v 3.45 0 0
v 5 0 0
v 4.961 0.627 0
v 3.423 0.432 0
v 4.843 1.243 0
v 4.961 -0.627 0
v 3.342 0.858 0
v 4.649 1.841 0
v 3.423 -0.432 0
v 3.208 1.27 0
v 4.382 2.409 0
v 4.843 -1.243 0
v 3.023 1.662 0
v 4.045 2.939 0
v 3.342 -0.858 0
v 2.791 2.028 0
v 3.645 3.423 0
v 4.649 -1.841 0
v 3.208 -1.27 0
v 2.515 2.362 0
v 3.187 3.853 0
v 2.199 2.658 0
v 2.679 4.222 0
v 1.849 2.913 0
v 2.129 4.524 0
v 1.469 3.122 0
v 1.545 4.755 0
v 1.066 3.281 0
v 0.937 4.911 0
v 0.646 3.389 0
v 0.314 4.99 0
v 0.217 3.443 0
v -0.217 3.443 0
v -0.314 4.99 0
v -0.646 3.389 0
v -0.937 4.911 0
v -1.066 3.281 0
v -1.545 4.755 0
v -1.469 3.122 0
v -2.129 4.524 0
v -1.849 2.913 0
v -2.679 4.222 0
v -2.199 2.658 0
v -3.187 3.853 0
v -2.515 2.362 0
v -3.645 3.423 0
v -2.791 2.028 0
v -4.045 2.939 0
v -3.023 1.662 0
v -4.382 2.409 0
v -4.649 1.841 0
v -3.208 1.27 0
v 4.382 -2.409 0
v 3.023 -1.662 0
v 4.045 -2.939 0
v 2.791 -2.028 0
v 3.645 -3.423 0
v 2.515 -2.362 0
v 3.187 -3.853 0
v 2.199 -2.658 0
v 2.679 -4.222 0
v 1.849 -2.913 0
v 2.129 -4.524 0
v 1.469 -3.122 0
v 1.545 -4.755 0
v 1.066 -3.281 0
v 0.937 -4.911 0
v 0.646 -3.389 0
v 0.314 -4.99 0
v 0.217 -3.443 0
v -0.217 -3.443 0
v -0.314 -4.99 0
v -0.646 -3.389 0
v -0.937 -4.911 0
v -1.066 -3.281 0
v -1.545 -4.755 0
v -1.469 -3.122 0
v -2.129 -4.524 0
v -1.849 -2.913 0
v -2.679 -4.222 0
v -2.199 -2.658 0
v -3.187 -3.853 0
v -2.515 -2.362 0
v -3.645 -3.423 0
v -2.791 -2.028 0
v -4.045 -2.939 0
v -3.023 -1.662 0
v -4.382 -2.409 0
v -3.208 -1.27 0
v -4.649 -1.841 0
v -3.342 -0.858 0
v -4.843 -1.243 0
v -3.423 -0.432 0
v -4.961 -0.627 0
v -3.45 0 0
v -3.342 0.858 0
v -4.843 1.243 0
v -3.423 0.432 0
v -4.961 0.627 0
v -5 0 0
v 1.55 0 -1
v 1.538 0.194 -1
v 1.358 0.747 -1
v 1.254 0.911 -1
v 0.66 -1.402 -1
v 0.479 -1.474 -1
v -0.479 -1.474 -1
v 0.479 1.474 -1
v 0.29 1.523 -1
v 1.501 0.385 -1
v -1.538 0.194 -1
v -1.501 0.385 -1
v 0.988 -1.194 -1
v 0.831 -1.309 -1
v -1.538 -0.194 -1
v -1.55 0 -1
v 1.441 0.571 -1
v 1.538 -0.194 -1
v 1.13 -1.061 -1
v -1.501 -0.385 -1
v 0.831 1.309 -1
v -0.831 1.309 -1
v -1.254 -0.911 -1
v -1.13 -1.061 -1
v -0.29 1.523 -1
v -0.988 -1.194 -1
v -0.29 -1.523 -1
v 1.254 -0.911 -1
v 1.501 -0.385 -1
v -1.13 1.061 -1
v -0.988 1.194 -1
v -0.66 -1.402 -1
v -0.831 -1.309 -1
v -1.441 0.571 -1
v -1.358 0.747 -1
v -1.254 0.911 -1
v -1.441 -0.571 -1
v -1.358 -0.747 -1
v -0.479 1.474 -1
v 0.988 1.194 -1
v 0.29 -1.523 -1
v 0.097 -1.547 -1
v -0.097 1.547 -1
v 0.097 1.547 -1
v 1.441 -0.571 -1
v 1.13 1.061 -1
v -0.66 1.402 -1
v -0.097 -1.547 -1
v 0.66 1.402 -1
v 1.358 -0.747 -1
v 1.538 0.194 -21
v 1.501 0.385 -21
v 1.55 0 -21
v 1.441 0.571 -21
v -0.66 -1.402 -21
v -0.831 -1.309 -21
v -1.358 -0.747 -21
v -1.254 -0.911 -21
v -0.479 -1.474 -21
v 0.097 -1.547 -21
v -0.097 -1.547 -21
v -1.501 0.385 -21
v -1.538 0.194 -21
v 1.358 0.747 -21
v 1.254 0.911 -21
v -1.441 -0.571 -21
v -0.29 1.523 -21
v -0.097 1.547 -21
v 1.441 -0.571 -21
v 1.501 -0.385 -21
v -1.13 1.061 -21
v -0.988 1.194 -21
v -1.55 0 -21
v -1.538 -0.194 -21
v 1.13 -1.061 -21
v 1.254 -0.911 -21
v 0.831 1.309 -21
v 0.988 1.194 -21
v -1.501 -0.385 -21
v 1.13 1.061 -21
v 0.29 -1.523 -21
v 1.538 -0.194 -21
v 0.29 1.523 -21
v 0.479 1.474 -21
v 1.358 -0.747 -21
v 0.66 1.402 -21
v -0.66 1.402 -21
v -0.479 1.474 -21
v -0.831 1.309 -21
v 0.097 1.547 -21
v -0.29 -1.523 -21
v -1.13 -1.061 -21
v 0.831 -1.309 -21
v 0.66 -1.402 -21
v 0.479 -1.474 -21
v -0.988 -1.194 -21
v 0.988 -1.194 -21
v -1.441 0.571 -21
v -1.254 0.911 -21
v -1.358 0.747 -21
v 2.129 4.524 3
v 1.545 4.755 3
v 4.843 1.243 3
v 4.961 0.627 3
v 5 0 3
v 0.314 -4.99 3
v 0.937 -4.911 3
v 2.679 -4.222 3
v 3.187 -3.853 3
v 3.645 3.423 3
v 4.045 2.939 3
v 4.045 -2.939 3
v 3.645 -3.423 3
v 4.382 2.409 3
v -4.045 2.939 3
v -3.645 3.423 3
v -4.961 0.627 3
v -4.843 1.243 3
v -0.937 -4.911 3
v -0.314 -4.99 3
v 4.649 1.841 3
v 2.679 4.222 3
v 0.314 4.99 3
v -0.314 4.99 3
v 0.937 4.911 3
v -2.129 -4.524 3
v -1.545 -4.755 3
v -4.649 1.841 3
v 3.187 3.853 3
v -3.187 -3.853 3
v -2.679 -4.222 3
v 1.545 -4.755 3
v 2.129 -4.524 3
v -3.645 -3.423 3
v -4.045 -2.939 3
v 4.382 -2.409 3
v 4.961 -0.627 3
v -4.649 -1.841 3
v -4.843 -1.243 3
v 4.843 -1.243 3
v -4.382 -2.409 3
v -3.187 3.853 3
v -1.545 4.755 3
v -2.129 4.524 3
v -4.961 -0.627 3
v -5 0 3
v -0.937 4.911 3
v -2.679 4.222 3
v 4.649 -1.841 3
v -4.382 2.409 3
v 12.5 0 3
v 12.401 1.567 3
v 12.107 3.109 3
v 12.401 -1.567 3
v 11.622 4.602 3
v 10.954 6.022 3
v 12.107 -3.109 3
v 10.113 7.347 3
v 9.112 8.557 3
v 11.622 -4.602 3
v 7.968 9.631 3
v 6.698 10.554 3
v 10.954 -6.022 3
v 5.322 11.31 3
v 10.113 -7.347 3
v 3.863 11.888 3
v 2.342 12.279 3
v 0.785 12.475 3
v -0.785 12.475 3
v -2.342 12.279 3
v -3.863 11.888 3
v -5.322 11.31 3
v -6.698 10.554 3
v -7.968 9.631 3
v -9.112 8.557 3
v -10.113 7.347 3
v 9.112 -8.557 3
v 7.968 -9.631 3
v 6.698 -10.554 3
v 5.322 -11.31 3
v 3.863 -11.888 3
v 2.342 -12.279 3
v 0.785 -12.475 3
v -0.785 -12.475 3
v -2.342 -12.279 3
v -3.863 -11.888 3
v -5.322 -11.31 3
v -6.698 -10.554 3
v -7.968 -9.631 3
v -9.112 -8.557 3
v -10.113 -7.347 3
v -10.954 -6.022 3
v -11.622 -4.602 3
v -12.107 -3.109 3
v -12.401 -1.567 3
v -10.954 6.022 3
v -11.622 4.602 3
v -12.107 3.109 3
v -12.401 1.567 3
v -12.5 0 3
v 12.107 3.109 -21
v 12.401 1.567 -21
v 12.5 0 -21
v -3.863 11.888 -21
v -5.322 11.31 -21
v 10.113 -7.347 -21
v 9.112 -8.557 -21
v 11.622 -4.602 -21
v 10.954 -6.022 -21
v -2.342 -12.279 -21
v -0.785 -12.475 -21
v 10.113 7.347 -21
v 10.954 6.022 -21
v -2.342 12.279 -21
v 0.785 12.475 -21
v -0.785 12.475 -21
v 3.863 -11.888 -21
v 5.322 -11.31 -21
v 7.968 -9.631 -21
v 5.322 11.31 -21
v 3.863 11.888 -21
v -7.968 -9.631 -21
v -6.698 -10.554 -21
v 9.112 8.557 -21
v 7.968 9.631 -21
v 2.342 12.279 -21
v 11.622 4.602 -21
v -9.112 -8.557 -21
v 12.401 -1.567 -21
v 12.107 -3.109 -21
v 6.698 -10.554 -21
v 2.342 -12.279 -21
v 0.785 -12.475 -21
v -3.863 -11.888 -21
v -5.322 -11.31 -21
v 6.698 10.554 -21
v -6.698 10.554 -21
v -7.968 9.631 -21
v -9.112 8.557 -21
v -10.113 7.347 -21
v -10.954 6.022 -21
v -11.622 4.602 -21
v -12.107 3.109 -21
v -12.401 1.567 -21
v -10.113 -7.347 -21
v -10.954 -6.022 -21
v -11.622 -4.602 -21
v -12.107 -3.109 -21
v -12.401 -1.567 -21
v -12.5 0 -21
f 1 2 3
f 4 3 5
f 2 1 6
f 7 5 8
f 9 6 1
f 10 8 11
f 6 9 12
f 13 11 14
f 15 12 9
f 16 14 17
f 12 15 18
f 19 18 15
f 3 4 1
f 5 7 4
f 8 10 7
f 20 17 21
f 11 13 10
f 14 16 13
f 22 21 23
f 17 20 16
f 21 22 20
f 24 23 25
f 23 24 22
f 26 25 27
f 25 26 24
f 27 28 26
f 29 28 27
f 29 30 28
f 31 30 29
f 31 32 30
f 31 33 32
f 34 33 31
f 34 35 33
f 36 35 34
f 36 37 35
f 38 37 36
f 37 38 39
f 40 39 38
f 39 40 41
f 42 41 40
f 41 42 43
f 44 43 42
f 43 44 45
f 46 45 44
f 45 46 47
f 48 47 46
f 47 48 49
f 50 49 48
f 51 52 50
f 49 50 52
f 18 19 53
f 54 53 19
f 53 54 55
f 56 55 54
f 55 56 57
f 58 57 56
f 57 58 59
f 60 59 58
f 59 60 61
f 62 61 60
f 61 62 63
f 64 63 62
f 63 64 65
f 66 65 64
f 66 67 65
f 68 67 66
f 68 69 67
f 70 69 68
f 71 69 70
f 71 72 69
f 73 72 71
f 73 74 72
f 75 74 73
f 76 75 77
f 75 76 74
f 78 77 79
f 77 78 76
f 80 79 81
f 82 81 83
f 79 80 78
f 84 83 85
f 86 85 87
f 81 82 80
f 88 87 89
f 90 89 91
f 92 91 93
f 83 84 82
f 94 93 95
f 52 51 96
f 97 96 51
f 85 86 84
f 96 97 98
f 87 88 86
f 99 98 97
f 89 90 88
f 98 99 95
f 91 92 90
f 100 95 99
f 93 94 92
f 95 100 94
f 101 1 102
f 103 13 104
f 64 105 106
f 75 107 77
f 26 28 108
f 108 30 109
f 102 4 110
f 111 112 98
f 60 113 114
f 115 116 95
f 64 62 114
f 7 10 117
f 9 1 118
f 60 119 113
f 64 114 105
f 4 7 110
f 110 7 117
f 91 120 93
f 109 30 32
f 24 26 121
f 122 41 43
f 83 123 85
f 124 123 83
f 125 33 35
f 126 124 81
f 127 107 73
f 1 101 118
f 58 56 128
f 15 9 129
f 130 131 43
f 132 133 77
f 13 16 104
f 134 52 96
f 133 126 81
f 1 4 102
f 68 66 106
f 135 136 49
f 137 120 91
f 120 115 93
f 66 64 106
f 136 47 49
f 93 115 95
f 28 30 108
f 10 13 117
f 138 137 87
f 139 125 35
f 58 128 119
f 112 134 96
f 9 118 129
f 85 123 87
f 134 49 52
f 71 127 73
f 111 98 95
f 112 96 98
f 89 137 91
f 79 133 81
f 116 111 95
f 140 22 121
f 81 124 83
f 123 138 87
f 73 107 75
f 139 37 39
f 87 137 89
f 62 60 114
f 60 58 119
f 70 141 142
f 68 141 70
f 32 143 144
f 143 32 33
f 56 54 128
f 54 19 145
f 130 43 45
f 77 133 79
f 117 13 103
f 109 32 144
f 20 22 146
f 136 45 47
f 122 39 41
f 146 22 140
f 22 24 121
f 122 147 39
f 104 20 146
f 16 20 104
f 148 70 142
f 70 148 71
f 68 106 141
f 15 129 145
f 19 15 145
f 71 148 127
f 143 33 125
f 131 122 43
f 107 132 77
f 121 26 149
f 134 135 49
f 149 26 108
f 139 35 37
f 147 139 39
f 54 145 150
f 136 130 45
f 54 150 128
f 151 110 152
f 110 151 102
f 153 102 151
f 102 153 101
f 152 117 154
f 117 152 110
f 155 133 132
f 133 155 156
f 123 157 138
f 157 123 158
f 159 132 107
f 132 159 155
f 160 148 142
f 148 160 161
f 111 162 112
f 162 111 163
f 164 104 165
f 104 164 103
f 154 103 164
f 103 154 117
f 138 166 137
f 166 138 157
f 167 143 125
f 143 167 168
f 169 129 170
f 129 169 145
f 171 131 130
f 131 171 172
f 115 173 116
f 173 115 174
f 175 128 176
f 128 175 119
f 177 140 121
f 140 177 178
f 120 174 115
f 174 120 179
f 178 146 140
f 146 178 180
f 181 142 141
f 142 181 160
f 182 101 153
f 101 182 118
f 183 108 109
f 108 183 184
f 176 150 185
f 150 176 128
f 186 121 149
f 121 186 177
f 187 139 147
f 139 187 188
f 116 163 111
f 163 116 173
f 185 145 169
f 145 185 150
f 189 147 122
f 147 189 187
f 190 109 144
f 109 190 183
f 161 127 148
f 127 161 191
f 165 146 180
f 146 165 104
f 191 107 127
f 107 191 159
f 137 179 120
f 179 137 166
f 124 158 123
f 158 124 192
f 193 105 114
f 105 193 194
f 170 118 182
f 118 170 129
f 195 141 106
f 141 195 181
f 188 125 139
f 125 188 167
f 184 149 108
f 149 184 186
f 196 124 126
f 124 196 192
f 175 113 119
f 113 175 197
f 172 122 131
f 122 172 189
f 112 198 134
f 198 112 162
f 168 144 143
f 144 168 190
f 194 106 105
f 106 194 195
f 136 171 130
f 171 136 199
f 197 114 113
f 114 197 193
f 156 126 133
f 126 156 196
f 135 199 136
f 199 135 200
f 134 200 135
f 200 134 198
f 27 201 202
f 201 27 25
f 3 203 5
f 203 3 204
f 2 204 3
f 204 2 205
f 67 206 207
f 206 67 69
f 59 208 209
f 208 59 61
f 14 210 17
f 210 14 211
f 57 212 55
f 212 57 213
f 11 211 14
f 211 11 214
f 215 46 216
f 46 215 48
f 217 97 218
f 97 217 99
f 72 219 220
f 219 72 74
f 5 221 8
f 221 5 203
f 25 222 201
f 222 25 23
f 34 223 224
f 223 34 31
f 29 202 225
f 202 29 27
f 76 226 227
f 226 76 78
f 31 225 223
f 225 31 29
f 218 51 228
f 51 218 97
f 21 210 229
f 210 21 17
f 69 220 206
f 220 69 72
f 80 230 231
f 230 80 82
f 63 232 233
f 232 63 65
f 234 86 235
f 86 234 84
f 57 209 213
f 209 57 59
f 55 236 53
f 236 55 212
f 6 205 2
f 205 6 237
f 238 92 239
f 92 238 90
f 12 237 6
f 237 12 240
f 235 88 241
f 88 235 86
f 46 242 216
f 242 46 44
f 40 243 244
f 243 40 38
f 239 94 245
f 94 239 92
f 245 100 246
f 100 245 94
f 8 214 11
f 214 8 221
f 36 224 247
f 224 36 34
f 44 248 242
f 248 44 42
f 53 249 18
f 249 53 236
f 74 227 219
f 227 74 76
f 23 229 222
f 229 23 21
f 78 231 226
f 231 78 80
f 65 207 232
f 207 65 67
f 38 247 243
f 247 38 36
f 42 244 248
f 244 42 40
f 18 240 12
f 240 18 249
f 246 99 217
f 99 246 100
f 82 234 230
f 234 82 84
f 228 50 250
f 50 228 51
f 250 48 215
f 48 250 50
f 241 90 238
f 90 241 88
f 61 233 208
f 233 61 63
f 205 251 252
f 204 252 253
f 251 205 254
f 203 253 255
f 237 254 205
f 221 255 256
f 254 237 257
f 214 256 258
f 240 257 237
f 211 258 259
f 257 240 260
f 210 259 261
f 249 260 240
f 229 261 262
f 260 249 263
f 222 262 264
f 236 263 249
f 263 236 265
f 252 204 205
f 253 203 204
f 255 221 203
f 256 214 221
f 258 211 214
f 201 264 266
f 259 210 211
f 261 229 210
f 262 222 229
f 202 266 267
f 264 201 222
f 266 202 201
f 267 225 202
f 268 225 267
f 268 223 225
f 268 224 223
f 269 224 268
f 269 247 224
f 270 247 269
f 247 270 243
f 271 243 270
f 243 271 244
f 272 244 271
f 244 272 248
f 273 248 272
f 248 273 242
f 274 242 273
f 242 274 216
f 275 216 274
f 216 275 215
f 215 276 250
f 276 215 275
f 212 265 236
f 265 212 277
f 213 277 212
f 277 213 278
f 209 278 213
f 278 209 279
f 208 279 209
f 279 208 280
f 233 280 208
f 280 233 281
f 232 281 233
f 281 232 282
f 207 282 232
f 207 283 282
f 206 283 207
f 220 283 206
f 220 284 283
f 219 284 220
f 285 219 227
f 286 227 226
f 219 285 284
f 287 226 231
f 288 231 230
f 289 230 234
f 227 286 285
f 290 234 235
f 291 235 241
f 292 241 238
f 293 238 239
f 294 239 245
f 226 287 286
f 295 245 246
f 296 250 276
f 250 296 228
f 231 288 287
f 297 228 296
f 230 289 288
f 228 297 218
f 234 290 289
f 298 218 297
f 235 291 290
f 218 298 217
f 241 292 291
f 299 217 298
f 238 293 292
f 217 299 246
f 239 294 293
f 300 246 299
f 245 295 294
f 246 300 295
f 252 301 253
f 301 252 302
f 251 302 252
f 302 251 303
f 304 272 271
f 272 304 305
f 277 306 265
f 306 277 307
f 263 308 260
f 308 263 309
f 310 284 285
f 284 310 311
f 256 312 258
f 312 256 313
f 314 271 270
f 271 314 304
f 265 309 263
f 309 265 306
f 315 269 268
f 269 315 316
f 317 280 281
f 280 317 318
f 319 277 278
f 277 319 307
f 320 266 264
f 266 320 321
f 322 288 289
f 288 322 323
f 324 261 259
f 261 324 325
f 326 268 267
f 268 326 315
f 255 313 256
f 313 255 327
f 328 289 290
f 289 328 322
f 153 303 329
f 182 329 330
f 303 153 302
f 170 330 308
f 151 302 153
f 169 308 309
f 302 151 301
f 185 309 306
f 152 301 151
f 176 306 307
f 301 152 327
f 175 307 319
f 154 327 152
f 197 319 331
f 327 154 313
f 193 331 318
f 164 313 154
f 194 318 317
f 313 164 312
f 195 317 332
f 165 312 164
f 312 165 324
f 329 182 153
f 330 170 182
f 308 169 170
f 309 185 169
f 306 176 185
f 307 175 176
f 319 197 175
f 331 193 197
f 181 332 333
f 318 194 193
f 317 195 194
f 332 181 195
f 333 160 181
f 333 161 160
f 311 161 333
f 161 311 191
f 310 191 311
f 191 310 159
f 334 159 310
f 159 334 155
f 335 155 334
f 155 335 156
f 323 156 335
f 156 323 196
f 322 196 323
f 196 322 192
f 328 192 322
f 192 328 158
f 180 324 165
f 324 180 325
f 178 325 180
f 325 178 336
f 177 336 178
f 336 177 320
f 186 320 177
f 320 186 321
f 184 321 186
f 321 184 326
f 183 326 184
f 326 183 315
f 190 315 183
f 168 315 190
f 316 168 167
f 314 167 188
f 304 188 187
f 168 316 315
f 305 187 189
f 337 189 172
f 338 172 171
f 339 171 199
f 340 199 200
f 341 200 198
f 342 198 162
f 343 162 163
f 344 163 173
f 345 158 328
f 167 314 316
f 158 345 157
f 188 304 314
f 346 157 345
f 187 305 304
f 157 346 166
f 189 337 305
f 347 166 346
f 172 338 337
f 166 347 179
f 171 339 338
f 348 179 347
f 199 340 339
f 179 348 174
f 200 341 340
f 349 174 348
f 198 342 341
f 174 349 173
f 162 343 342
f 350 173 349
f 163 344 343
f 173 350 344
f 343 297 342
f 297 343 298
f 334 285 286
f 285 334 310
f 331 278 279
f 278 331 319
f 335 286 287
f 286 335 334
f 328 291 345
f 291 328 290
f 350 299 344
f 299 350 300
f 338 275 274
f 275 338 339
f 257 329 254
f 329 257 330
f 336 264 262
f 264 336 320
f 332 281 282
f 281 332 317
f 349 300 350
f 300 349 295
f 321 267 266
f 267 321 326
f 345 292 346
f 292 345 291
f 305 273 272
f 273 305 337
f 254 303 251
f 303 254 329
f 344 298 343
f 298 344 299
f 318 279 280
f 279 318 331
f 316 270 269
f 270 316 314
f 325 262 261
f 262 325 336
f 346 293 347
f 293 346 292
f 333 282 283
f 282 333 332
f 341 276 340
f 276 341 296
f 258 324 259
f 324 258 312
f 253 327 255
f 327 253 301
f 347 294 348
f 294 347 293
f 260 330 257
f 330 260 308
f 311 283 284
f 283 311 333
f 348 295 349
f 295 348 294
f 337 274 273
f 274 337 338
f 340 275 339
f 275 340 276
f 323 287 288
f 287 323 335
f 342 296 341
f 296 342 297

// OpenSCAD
$fn = 50;

difference() {
	union() {
		translate(v = [0, 0, -21.0]) {
			cylinder(h = 24, r = 12.5);
		}
	}
	union() {
		translate(v = [0, 0, 0]) {
			rotate(a = [0, 0, 0]) {
				difference() {
					union() {
						translate(v = [0, 0, -24.0]) {
							cylinder(h = 24, r = 1.25);
						}
						translate(v = [0, 0, -1.0]) {
							cylinder(h = 1.0, r1 = 1.55, r2 = 3.45);
						}
						translate(v = [0, 0, -24.0]) {
							cylinder(h = 24, r = 1.55);
						}
						translate(v = [0, 0, -24.0]) {
							cylinder(h = 24, r = 1.25);
						}
					}
					union();
				}
			}
		}
		#cylinder(h = 3, r = 5.0);
	}
}
